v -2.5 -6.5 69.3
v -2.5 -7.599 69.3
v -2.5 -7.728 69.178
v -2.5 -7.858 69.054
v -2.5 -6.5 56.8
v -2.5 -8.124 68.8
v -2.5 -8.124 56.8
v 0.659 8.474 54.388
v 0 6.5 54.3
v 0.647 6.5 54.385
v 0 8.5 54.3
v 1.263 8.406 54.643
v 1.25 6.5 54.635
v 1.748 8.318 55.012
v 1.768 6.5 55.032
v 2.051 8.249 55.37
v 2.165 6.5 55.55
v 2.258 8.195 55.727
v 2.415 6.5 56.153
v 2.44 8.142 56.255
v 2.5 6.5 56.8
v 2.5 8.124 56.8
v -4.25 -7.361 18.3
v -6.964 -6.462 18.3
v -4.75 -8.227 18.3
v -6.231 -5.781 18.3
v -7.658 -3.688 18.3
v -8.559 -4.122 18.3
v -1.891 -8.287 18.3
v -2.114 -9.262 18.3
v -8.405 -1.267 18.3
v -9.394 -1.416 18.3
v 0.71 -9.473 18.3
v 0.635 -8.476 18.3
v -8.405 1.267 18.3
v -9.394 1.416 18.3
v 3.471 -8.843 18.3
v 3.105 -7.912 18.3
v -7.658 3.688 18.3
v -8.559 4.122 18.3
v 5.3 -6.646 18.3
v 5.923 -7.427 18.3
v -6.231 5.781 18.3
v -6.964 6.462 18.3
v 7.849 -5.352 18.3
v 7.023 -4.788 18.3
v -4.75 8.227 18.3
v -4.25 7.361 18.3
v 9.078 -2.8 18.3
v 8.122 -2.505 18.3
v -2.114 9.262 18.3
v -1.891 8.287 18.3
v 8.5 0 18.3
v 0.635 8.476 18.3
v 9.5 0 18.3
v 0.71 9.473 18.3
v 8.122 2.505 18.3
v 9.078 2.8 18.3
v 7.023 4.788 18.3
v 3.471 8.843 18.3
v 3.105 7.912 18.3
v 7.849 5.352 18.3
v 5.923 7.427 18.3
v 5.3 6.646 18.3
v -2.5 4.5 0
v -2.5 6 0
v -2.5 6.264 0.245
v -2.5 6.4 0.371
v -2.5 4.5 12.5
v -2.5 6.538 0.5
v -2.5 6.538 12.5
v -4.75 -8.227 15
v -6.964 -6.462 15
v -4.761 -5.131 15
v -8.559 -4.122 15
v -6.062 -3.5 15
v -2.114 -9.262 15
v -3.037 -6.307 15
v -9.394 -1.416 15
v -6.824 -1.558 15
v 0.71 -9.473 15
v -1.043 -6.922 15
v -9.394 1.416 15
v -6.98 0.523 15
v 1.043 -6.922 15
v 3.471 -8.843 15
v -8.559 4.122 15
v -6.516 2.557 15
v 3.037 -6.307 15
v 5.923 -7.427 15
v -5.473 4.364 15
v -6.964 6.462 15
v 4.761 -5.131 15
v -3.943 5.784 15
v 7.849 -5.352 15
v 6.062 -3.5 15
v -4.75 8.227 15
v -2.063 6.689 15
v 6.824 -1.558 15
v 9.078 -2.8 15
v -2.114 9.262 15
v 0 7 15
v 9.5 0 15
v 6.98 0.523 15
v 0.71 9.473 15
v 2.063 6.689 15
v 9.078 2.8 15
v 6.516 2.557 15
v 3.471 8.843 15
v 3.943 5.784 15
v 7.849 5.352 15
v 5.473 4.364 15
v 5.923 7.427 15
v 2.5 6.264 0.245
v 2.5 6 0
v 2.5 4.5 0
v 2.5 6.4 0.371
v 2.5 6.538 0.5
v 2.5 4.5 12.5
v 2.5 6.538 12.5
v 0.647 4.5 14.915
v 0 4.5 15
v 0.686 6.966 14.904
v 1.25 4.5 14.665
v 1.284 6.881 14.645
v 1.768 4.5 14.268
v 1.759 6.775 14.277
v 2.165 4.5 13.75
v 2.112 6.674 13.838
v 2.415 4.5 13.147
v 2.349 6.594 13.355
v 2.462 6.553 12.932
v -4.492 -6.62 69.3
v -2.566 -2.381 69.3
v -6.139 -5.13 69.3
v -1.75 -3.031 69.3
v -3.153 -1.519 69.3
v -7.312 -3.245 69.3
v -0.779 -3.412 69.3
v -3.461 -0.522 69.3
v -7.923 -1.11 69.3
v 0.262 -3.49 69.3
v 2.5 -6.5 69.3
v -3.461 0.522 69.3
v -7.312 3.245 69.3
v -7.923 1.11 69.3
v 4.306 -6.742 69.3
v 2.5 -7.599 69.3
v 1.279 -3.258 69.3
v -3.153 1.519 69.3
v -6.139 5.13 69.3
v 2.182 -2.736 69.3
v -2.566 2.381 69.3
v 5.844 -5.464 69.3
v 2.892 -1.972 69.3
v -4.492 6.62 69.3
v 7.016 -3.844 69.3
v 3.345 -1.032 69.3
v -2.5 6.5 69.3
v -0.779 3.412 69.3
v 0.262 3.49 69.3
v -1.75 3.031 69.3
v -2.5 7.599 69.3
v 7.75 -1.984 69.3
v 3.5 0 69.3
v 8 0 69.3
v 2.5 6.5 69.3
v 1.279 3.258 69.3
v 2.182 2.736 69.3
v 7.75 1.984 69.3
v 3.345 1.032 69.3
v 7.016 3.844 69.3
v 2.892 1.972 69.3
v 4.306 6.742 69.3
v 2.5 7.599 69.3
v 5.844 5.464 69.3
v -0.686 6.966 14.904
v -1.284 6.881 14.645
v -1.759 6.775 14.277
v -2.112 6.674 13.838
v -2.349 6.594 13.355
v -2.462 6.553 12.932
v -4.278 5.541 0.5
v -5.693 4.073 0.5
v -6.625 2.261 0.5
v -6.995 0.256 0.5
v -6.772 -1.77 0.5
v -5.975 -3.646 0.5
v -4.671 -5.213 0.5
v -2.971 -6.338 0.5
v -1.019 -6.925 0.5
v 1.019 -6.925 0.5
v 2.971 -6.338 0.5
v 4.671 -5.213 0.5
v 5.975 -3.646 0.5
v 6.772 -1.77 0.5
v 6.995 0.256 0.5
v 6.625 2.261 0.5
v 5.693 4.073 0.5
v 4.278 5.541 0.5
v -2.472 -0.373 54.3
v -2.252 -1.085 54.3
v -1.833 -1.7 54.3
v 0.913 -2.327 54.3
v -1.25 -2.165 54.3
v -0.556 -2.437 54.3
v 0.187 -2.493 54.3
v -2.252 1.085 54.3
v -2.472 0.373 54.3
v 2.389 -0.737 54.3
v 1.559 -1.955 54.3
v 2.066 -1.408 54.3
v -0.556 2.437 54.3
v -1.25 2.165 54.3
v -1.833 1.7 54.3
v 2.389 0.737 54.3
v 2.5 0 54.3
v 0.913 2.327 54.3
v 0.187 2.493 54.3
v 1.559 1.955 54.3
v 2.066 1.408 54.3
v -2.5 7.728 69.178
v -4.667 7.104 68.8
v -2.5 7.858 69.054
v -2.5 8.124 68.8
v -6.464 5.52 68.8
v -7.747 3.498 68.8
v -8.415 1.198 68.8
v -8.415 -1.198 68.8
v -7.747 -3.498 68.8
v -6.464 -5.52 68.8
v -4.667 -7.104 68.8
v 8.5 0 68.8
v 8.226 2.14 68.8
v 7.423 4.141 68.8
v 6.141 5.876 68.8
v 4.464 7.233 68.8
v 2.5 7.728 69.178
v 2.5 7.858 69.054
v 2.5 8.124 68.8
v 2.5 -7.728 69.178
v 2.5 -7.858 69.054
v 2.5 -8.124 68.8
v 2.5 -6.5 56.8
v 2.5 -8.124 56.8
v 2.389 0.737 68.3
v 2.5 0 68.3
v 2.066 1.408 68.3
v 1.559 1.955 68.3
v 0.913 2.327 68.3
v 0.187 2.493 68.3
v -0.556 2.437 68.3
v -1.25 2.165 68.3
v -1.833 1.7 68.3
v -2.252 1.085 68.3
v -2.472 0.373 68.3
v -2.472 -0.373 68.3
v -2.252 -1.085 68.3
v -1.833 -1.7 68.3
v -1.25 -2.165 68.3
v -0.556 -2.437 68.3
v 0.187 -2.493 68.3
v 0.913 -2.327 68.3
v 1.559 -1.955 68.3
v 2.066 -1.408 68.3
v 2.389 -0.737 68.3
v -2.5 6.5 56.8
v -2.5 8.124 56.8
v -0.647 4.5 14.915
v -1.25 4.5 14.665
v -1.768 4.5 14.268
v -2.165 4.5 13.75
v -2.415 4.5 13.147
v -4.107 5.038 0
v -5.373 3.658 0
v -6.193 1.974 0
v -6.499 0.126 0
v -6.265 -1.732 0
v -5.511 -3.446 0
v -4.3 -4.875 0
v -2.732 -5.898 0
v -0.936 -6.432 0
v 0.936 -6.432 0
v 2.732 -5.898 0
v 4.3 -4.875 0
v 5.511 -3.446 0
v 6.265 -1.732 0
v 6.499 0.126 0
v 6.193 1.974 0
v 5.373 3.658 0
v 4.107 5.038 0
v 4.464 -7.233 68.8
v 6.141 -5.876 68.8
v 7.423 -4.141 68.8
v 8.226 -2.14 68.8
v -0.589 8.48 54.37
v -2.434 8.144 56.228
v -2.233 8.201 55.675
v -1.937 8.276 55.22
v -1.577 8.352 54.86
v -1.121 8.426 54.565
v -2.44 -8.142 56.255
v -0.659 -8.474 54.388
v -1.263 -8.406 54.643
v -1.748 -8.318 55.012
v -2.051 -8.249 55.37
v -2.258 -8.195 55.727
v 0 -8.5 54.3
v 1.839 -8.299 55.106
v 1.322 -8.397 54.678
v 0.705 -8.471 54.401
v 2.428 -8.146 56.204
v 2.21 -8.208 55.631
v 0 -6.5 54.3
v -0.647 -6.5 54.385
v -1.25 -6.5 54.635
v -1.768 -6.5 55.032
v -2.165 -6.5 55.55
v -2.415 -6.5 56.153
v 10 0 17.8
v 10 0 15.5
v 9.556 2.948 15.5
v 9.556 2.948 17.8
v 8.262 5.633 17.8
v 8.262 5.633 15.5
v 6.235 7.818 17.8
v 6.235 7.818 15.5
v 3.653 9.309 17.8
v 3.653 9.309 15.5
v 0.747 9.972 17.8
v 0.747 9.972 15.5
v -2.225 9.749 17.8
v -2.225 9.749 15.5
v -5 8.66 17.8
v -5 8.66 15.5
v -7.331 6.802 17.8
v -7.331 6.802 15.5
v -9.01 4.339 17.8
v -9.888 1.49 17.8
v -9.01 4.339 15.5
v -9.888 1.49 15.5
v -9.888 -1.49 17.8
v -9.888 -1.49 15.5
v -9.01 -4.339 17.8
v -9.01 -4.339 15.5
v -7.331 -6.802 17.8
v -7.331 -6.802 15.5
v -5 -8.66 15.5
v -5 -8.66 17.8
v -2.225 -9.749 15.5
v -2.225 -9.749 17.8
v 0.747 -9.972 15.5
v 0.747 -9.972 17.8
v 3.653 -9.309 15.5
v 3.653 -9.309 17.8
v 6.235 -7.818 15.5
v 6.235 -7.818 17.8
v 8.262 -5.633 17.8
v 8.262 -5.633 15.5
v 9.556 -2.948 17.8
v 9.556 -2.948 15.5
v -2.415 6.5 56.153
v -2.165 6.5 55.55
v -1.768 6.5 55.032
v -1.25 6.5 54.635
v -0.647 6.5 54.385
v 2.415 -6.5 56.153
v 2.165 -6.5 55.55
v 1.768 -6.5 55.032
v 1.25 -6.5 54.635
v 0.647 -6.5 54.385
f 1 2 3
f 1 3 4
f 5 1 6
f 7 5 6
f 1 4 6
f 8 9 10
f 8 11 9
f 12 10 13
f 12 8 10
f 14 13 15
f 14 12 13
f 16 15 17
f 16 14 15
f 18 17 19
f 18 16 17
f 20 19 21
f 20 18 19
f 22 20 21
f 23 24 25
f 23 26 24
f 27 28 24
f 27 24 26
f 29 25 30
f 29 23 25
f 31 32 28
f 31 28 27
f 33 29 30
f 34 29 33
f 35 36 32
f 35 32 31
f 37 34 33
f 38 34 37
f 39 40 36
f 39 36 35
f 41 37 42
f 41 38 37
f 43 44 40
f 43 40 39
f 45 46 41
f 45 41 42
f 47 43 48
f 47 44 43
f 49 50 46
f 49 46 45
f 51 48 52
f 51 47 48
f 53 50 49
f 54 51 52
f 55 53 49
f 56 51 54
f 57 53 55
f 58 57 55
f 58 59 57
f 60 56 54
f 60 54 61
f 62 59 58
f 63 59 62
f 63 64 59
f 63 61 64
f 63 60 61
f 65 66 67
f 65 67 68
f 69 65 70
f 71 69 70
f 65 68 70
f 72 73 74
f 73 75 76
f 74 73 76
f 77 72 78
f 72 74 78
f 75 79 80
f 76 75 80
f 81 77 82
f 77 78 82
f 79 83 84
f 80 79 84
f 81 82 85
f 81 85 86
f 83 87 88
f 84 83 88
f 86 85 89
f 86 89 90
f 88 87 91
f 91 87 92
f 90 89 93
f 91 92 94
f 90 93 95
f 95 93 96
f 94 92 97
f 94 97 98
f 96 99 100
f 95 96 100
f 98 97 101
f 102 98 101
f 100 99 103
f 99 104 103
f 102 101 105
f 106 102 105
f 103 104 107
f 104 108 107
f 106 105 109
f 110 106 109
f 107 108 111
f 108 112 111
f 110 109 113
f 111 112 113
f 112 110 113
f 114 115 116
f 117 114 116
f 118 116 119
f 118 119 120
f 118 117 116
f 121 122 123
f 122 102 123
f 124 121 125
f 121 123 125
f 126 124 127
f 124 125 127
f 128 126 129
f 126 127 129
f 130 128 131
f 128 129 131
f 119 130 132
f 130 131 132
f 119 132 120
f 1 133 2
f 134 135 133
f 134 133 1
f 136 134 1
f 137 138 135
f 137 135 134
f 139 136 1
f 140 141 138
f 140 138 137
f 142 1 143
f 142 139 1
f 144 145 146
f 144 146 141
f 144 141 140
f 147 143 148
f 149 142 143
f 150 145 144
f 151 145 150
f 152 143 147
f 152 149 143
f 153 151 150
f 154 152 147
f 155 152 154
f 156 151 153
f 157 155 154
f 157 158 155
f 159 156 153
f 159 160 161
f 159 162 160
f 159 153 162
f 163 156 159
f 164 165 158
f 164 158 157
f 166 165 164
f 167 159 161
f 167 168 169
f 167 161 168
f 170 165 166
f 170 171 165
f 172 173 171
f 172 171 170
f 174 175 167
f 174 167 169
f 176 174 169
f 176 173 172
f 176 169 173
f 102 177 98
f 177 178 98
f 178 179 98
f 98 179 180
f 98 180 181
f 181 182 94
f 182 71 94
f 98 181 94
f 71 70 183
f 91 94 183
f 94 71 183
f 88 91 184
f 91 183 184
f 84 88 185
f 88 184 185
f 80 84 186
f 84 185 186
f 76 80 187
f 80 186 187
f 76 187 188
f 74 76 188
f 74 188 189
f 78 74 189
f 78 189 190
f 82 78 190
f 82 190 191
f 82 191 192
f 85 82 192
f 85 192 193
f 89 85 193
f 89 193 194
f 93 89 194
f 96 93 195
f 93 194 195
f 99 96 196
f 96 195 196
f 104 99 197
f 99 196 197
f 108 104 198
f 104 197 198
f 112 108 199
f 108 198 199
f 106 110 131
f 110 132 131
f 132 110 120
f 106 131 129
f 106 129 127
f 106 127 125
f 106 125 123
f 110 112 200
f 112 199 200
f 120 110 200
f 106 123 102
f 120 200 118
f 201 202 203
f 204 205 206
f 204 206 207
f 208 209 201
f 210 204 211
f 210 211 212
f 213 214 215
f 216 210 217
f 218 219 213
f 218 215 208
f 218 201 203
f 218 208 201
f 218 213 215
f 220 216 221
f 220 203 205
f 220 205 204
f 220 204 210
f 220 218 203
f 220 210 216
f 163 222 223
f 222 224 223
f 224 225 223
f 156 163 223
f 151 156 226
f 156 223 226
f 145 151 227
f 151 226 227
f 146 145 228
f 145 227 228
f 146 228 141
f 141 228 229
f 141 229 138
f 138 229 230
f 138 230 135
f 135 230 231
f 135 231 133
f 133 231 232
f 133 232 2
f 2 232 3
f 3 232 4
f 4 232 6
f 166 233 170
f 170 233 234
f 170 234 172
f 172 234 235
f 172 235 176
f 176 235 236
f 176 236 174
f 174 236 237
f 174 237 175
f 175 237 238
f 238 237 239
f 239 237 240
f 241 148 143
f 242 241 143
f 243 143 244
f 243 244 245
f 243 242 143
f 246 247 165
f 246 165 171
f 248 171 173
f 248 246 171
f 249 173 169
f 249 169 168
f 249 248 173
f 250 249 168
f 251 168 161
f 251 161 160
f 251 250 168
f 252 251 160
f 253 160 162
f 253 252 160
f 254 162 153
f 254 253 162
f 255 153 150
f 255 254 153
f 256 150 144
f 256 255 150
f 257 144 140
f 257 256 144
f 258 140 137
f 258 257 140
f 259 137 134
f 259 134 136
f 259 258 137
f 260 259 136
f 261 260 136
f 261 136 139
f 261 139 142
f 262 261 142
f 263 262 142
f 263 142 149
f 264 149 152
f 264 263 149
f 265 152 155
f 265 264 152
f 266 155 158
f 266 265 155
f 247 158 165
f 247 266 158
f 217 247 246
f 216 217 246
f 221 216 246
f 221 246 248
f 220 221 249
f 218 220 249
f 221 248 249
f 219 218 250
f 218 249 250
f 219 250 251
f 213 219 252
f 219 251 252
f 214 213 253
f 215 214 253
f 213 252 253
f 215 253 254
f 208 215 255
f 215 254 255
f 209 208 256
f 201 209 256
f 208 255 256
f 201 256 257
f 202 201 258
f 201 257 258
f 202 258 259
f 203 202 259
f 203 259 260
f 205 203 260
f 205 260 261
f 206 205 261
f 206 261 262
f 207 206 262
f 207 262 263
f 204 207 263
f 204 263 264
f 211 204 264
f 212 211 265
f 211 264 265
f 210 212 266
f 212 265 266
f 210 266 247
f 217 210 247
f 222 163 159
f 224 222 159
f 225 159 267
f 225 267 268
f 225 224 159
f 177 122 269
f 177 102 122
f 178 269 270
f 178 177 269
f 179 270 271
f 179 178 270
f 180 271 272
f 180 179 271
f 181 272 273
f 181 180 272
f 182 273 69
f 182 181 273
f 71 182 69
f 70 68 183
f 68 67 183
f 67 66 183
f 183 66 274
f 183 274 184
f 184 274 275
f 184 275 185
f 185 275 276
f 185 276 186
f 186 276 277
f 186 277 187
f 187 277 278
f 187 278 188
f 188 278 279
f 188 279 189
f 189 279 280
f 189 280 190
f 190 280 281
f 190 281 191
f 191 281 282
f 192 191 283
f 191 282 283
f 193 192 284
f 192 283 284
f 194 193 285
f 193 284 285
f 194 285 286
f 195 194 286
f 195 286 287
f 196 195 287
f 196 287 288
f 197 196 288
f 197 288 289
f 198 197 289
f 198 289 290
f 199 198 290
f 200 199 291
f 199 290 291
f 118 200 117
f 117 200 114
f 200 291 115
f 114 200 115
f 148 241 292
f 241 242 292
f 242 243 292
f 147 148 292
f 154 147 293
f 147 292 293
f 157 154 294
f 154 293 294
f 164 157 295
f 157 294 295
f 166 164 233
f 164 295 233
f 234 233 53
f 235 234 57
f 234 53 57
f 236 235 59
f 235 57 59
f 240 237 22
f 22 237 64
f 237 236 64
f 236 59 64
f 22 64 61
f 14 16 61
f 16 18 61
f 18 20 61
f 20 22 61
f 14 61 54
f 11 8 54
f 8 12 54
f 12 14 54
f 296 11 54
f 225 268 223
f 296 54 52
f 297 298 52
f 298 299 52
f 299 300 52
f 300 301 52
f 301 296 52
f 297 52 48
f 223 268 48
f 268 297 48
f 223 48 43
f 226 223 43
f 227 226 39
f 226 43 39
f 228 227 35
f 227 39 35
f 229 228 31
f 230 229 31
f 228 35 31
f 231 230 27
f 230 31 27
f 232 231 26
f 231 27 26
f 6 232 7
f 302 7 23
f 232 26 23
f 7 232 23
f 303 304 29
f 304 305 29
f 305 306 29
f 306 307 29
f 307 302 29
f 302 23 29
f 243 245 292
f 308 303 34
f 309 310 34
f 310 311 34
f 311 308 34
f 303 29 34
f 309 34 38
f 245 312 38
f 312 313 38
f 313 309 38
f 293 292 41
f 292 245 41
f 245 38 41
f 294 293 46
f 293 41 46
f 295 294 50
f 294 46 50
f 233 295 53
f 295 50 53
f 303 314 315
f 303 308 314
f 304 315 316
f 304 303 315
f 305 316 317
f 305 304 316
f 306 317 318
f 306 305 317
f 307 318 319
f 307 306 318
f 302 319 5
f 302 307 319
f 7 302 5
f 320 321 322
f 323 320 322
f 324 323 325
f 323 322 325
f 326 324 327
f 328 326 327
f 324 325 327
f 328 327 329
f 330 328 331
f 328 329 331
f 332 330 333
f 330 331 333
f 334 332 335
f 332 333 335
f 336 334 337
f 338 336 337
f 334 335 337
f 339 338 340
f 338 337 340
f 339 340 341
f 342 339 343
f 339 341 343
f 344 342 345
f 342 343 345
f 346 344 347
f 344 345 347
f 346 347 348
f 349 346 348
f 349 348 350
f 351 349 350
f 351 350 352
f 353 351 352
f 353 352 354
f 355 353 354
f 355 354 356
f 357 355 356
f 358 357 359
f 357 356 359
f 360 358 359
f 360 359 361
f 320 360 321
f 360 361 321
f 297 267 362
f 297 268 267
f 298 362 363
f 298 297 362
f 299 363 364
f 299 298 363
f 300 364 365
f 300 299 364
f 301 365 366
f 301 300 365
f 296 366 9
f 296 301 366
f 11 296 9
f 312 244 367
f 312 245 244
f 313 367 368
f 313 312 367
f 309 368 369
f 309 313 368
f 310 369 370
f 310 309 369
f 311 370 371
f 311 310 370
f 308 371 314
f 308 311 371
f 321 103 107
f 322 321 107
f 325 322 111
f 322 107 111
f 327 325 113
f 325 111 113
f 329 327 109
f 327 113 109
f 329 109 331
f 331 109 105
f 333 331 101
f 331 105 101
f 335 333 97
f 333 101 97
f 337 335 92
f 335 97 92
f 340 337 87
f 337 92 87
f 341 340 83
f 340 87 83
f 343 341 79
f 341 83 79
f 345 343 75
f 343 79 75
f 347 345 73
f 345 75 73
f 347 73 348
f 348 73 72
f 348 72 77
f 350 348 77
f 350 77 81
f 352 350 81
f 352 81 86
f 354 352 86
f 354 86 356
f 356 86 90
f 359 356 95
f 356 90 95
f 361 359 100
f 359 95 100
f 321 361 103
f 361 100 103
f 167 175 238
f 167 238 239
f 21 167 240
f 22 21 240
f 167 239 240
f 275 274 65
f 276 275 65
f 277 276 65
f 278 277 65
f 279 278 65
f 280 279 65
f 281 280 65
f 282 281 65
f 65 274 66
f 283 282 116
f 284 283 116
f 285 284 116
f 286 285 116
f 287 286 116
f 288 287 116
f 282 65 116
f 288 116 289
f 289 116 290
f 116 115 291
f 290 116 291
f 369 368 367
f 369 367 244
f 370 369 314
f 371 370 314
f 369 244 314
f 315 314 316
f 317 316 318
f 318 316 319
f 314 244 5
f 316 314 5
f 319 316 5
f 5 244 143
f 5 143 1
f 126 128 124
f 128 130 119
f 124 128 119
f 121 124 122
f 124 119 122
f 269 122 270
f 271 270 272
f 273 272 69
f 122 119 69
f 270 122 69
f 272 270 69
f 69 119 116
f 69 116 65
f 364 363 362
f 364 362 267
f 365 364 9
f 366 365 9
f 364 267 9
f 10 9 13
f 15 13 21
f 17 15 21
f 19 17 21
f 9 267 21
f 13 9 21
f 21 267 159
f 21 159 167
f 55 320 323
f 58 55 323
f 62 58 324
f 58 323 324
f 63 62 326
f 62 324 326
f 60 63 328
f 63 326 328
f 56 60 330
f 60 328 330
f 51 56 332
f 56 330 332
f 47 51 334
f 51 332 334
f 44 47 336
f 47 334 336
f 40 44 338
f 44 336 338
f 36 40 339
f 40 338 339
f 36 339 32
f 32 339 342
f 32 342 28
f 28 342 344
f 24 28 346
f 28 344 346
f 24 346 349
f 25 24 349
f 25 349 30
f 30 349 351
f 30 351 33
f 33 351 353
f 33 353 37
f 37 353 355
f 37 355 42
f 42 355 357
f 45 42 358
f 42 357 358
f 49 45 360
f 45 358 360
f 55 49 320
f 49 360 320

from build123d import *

# Parameters (mm, degrees)
SKETCH_1_R               = 7
EXTRUDE_1_DEPTH          = 15
SKETCH_3_R               = 10
EXTRUDE_2_DEPTH          = 3.3
SKETCH_4_R               = 8.5
EXTRUDE_3_DEPTH          = 51
SKETCH_6_W               = 5
SKETCH_6_H               = 2.626010101
CUT_EXTRUDE_1_DEPTH      = 15
FILLET_1_R               = 2.5
SKETCH_7_R               = 2.5
CUT_EXTRUDE_2_DEPTH      = 15
SKETCH_8_W               = 5
SKETCH_8_H               = 2.5
CUT_EXTRUDE_3_DEPTH      = 15
FILLET_2_R               = 2.5
CHAMFER_1_SIZE           = 1
CHAMFER_2_SIZE           = 0.5
CHAMFER_3_SIZE           = 0.5
PATTERN_CIRCULAR_1_COUNT = 2
FILLET_3_R               = 2.5


with BuildPart() as part:
    # 草图1 → 拉伸1 (new body)
    with BuildSketch(Plane.XY):
        Circle(SKETCH_1_R)
    extrude(amount=EXTRUDE_1_DEPTH)

    # 草图3 → 拉伸2 (add)
    with BuildSketch(Plane.XY.offset(15)):
        Circle(SKETCH_3_R)
    extrude(amount=EXTRUDE_2_DEPTH)

    # 草图4 → 拉伸3 (add)
    with BuildSketch(Plane.XY.offset(18.3)):
        Circle(SKETCH_4_R)
    extrude(amount=EXTRUDE_3_DEPTH)

    # 草图6 → 切除-拉伸1 (cut)
    with BuildSketch(Plane.XY.offset(69.3)):
        with Locations((0, 7.813005051)):
            Rectangle(SKETCH_6_W, SKETCH_6_H)
    cut_extrude_1 = extrude(amount=-CUT_EXTRUDE_1_DEPTH, mode=Mode.SUBTRACT)

    # 圆角1
    fillet_1_edges = [part.edges().sort_by_distance(p)[0] for p in [
        (-2.5, 7.312019202, 54.3),
        (2.5, 7.312019202, 54.3),
    ]]
    fillet(fillet_1_edges, radius=FILLET_1_R - 0.0001)  # a hair under: the kernel refuses the full size

    # 草图7 → 切除-拉伸2 (cut)
    with BuildSketch(Plane.XY.offset(69.3)):
        Circle(SKETCH_7_R)
    extrude(amount=-CUT_EXTRUDE_2_DEPTH, mode=Mode.SUBTRACT)

    # 草图8 → 切除-拉伸3 (cut)
    with BuildSketch(Plane(origin=(0, 0, 0), x_dir=(-1, 0, 0), z_dir=(0, 0, -1))):
        with Locations((0, 5.75)):
            Rectangle(SKETCH_8_W, SKETCH_8_H)
    extrude(amount=-CUT_EXTRUDE_3_DEPTH, mode=Mode.SUBTRACT)

    # 圆角2
    fillet_2_edges = [part.edges().sort_by_distance(p)[0] for p in [
        (-2.5, 5.519174208, 15),
        (2.5, 5.519174208, 15),
    ]]
    fillet(fillet_2_edges, radius=FILLET_2_R - 0.0001)  # a hair under: the kernel refuses the full size

    # 倒角1
    chamfer_1_edges = [part.edges().sort_by_distance(p)[0] for p in [
        (-2.5, 0, 69.3),
    ]]
    chamfer(chamfer_1_edges, length=CHAMFER_1_SIZE)

    # 倒角2
    chamfer_2_edges = [part.edges().sort_by_distance(p)[0] for p in [
        (-5.049752469, -6.837397166, 69.3),
        (-10, 0, 15),
        (-10, 0, 18.3),
    ]]
    chamfer(chamfer_2_edges, length=CHAMFER_2_SIZE)

    # 倒角3
    chamfer_3_edges = [part.edges().sort_by_distance(p)[0] for p in [
        (0, -7, 0),
    ]]
    chamfer(chamfer_3_edges, length=CHAMFER_3_SIZE)

    # 阵列(圆周)1: 切除-拉伸1 ×2 about axis
    pattern_circular_1_axis = Axis((0, 0, 0), (0, 0, 1))
    for i in range(1, PATTERN_CIRCULAR_1_COUNT):
        add(cut_extrude_1.rotate(pattern_circular_1_axis, i * 360 / PATTERN_CIRCULAR_1_COUNT), mode=Mode.SUBTRACT)

    # 圆角3
    fillet_3_edges = [part.edges().sort_by_distance(p)[0] for p in [
        (-2.5, -7.312019202, 54.3),
        (2.5, -7.312019202, 54.3),
    ]]
    fillet(fillet_3_edges, radius=FILLET_3_R - 0.0001)  # a hair under: the kernel refuses the full size


solid = part.part
